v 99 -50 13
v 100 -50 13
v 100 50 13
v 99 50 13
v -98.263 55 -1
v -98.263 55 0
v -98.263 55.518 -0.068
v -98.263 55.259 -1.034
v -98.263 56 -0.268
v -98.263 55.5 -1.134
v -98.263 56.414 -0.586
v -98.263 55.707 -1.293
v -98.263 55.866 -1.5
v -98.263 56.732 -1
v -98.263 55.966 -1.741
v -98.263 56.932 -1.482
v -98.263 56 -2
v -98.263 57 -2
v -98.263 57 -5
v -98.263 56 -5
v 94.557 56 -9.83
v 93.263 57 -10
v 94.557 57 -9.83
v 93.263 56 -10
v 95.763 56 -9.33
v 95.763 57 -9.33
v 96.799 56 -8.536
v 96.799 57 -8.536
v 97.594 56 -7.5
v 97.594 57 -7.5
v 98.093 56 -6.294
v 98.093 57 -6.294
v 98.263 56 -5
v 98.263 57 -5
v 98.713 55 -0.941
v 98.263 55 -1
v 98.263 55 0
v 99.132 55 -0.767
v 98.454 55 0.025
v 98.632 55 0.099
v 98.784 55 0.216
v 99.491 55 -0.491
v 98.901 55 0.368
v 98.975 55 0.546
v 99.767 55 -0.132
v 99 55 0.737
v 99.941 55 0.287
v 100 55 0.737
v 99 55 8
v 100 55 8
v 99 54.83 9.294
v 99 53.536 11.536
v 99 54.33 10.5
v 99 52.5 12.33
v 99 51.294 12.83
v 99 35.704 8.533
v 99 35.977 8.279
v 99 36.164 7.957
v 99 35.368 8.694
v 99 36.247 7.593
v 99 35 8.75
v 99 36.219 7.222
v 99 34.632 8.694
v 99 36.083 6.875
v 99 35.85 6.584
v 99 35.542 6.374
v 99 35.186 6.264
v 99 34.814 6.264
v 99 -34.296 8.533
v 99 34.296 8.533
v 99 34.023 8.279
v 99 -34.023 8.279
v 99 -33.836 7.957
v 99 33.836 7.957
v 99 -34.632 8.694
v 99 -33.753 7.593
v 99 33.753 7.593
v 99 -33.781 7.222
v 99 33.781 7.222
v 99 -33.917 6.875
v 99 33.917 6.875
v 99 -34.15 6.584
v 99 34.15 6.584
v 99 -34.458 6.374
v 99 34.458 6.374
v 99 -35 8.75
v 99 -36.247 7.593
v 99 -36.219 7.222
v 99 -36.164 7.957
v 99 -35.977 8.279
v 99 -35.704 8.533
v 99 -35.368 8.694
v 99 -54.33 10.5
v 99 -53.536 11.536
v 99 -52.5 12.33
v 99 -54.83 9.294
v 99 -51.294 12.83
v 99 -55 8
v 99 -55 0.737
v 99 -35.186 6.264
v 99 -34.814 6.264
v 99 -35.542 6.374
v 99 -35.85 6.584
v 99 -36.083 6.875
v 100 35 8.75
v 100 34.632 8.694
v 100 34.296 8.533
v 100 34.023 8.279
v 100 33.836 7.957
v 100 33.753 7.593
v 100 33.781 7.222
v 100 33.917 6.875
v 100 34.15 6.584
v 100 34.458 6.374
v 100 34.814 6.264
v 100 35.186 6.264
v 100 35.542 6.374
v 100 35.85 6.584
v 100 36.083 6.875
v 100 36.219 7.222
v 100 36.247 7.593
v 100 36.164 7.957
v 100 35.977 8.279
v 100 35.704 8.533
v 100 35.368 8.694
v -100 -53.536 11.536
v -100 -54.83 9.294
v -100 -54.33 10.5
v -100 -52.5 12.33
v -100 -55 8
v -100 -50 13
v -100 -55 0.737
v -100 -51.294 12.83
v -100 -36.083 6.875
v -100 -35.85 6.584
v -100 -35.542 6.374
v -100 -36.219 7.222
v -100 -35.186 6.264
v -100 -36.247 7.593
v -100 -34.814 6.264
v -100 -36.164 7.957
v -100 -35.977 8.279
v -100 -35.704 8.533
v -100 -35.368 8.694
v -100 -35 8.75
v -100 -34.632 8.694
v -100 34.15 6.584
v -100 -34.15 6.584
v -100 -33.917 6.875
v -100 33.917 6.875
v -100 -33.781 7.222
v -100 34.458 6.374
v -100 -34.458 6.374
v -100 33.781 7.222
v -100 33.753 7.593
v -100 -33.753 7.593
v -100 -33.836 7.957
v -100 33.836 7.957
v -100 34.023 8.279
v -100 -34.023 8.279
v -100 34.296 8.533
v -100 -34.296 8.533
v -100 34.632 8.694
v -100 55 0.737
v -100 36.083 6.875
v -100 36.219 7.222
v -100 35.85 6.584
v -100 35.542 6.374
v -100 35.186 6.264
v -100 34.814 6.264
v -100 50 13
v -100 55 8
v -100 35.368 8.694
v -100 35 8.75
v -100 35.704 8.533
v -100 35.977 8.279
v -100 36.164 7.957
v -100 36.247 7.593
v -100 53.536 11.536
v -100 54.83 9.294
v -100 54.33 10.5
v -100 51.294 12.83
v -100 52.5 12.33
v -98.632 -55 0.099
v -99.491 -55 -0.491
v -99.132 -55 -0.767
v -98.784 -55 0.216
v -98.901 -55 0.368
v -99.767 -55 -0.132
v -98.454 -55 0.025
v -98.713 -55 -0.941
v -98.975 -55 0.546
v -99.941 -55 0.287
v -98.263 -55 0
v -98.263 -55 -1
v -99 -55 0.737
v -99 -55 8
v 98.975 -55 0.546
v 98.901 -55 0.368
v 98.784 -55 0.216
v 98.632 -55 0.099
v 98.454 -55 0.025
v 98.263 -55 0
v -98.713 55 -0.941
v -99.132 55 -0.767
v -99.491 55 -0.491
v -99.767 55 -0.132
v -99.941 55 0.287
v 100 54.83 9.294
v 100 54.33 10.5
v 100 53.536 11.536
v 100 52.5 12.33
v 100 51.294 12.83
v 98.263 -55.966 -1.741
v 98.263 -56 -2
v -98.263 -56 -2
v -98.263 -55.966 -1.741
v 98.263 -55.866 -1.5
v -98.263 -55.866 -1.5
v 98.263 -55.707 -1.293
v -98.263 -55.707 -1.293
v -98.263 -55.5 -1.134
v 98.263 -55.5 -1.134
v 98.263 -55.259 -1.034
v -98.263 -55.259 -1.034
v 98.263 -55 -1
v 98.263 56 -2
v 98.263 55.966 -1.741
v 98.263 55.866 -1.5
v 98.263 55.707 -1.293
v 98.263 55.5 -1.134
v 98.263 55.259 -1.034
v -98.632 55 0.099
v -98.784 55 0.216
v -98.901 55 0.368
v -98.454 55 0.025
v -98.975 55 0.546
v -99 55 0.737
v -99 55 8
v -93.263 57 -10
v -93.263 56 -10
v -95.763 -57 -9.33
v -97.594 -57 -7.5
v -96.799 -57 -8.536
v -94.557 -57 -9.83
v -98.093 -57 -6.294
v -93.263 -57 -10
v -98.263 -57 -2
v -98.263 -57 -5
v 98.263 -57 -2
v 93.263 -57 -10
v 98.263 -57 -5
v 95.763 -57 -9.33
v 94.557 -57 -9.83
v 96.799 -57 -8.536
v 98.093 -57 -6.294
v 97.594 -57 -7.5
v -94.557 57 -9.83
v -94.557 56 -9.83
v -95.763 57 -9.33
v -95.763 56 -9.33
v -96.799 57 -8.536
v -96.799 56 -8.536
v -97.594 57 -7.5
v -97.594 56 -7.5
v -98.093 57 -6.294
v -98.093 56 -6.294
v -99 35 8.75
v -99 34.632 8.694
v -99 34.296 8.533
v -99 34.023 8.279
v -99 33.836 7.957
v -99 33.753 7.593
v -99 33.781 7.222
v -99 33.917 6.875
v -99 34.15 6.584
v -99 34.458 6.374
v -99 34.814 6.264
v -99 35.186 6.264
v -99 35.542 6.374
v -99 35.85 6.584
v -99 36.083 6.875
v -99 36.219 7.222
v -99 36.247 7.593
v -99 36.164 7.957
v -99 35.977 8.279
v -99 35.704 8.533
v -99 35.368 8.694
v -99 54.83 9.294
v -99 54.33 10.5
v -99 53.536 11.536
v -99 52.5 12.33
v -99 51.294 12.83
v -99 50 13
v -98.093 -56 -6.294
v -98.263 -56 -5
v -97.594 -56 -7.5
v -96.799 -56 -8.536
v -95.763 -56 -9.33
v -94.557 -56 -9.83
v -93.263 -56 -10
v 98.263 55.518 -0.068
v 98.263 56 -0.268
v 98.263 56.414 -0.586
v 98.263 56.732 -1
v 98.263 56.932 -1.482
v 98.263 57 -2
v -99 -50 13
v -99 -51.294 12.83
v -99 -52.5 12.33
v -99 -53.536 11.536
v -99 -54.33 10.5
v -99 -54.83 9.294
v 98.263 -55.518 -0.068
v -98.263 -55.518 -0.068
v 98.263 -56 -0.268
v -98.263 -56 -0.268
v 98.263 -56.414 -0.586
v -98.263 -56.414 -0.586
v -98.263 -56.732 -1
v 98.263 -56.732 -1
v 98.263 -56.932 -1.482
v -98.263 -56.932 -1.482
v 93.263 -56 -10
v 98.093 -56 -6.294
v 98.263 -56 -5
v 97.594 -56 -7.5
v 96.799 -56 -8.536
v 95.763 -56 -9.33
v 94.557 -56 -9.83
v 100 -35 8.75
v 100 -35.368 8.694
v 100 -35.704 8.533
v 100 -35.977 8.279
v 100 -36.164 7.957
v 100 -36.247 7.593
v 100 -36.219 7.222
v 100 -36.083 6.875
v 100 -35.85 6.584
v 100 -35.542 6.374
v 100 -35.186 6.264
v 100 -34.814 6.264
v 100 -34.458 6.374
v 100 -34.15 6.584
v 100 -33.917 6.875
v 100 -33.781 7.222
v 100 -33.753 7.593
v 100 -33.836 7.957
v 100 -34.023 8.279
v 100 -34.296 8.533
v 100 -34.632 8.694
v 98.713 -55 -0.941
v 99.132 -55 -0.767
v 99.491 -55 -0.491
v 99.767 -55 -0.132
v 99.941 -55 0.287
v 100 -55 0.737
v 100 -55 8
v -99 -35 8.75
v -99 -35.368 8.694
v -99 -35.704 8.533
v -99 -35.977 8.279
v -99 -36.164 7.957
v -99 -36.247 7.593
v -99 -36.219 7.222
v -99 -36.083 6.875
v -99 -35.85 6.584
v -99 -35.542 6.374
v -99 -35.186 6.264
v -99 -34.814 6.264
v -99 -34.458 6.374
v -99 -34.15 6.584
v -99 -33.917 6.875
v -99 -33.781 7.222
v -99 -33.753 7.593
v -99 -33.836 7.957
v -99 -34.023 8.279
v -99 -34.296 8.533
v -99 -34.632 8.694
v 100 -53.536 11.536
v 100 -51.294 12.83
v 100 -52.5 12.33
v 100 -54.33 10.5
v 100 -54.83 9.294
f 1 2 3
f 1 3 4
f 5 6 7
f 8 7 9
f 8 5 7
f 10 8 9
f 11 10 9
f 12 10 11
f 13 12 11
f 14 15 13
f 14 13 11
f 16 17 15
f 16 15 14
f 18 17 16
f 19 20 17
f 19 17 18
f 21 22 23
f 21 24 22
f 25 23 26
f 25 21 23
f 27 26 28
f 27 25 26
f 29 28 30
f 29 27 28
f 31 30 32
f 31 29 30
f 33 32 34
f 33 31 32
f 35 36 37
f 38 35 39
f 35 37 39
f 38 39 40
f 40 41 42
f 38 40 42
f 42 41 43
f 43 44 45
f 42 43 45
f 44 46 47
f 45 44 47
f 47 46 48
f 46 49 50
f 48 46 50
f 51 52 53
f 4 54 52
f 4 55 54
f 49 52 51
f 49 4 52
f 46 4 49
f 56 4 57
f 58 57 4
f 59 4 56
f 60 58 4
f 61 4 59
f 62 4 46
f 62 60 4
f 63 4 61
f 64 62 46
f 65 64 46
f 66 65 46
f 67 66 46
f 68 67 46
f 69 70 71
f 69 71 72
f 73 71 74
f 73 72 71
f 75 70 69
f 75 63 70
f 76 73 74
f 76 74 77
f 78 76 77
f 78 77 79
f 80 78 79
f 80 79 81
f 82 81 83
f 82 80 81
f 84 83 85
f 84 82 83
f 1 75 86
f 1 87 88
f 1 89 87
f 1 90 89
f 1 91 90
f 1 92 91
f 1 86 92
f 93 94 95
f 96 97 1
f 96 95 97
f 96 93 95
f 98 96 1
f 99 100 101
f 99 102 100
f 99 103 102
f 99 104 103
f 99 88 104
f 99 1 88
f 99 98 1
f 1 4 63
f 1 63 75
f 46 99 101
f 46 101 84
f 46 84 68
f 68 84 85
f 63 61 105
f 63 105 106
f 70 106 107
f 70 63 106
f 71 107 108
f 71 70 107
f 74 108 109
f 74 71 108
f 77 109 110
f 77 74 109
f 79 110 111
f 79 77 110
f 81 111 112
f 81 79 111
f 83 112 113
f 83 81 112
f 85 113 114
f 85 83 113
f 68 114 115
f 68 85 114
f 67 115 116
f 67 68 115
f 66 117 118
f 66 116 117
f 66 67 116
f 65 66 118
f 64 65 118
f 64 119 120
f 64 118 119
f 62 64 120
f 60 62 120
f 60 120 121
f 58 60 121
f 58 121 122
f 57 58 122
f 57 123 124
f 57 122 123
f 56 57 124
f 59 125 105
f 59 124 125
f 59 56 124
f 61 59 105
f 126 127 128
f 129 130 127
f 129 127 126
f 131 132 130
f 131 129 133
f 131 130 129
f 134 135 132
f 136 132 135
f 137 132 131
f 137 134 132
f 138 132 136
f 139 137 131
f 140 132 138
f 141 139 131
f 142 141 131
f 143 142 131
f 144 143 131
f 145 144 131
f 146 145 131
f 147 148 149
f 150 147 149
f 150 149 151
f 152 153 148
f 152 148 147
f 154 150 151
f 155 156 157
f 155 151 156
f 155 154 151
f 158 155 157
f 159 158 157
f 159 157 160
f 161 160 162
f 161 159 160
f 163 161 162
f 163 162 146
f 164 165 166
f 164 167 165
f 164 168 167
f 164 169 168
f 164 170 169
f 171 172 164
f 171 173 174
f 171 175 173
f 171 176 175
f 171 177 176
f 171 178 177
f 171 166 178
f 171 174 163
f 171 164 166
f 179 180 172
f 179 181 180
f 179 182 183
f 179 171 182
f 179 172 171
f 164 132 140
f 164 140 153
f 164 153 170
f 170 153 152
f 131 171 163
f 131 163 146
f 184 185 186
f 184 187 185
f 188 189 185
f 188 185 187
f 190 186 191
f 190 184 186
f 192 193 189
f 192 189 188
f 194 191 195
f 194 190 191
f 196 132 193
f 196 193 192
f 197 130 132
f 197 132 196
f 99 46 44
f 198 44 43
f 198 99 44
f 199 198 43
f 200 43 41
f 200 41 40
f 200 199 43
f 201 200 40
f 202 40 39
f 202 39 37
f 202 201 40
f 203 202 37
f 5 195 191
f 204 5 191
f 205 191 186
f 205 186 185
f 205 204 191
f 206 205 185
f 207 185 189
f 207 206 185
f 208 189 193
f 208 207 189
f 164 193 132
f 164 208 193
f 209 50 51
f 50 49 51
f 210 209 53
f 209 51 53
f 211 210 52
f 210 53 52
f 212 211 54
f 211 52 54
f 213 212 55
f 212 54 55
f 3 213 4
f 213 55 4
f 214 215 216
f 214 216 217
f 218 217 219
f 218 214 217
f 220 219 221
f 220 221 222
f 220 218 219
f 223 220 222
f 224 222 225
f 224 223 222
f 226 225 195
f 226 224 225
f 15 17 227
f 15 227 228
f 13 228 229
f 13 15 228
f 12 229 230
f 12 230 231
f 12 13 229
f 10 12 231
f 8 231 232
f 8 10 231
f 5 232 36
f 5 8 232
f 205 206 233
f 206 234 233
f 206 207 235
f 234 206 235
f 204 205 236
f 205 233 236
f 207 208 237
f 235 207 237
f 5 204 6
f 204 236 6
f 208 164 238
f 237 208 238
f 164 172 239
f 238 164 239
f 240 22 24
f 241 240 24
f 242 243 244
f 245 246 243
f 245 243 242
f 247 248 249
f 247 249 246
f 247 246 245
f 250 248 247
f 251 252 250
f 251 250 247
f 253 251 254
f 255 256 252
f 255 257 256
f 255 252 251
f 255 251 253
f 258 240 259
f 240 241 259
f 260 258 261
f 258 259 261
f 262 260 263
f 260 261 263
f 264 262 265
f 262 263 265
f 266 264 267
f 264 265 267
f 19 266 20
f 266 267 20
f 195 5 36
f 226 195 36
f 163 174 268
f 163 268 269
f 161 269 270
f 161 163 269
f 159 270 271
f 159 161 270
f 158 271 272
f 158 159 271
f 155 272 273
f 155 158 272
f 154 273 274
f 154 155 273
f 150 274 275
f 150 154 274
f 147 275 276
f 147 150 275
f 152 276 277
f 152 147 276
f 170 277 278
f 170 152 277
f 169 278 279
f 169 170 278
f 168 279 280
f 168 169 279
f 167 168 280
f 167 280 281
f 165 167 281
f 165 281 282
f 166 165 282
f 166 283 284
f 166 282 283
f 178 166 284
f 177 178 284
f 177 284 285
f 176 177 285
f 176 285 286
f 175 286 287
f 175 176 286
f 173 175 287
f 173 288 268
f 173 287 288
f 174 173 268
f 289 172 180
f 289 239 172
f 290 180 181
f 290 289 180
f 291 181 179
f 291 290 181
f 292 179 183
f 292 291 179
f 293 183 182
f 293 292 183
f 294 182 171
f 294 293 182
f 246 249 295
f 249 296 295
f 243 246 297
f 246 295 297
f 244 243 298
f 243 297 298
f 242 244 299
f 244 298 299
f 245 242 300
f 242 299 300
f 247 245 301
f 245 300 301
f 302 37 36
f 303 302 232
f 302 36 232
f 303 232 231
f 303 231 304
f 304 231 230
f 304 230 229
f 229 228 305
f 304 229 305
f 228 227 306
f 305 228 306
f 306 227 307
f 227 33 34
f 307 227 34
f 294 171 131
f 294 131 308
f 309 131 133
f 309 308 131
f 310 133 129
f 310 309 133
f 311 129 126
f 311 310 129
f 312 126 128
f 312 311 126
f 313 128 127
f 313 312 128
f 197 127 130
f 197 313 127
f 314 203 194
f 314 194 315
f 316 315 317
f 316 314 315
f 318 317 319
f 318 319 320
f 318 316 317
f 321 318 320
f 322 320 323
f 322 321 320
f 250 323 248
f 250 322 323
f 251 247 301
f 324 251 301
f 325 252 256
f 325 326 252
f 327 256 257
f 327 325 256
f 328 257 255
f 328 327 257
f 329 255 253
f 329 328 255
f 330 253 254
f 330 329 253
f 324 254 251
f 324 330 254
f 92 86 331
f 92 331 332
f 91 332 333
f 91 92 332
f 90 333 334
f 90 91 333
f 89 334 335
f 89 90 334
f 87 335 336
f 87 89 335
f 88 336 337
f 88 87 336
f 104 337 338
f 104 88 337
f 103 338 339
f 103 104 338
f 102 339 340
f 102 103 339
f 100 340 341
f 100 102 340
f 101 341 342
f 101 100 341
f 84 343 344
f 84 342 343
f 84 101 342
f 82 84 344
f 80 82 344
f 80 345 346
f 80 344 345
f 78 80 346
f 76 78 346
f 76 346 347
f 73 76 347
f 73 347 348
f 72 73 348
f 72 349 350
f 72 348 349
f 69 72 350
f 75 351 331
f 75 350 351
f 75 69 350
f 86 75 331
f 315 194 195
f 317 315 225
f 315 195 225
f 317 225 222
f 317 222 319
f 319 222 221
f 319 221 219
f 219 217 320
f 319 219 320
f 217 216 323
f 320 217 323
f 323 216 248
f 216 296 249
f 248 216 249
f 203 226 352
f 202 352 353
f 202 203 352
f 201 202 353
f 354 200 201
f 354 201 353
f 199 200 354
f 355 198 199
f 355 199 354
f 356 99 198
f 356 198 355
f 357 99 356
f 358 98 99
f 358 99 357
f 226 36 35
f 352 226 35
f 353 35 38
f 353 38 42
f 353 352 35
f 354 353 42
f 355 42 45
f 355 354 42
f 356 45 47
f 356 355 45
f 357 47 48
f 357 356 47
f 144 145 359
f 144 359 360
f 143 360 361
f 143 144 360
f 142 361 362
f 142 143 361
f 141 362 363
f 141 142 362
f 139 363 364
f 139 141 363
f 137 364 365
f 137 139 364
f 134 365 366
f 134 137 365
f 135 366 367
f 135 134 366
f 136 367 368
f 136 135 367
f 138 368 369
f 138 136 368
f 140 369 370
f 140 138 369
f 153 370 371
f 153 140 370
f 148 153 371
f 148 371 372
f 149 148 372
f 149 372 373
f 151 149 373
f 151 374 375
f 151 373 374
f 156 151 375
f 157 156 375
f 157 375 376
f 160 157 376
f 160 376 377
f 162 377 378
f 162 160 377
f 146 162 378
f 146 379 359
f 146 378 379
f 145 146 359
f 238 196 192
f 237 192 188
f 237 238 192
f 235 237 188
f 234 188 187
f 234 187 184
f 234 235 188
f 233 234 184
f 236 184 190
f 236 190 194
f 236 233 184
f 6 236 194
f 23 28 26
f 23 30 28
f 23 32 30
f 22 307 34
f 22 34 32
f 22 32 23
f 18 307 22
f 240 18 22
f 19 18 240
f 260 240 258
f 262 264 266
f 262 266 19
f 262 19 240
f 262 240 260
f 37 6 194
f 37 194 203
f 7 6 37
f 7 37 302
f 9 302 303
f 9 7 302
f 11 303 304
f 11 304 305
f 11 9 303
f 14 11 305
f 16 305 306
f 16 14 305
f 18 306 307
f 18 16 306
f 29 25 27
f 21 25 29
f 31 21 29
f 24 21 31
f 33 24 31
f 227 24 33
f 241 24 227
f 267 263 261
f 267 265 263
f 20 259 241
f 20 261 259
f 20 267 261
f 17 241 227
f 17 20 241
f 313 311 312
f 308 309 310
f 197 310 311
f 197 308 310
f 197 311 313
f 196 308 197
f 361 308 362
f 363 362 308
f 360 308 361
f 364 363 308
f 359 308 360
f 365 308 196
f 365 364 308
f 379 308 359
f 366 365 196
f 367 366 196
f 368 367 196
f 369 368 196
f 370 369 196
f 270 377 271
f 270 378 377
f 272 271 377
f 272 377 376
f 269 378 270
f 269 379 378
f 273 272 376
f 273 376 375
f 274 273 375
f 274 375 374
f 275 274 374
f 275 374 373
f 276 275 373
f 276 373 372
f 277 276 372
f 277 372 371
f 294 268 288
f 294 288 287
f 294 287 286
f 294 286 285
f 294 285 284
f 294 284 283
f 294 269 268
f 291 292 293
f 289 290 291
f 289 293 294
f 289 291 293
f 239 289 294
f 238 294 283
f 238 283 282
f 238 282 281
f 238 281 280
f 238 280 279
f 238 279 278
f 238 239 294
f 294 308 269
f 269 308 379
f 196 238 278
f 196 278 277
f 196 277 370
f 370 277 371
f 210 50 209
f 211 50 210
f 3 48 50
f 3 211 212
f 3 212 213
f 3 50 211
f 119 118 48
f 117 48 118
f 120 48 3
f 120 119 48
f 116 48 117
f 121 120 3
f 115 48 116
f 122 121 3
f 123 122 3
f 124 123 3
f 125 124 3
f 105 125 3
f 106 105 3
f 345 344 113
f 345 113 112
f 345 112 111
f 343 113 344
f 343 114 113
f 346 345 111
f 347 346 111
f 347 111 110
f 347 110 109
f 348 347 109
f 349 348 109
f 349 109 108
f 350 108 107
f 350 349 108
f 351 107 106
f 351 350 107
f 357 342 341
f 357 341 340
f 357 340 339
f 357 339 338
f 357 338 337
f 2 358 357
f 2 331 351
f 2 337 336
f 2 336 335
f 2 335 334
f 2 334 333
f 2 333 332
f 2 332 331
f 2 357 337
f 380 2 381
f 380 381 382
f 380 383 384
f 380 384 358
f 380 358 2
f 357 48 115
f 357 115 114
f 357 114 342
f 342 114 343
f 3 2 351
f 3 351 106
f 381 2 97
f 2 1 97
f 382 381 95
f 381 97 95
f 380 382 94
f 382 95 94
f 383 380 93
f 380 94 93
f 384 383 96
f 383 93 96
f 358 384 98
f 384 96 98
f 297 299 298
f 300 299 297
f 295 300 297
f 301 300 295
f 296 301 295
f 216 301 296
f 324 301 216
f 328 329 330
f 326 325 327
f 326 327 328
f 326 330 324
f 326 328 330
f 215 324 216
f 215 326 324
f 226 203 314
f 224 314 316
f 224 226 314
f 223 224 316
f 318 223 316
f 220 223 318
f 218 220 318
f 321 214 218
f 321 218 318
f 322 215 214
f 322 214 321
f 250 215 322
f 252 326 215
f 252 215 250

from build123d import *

# Parameters (mm, degrees)
SKETCH1_W                    = 200
SKETCH1_H                    = 110
BASE_FLANGE1_DEPTH           = 1
EDGE_FLANGE1_STRIP_W         = 5.4732
EDGE_FLANGE1_STRIP_H         = 1
EDGE_FLANGE1_STRIP_CUT_DEPTH = 110
EDGE_FLANGE1_DEPTH           = 110
EDGE_FLANGE2_STRIP_W         = 5.4732
EDGE_FLANGE2_STRIP_H         = 1
EDGE_FLANGE2_STRIP_CUT_DEPTH = 110
EDGE_FLANGE2_DEPTH           = 110
CUT_EXTRUDE1_DEPTH           = 207.869524097
CUT_EXTRUDE1_DEPTH_BACK      = 10
SKETCH14_R                   = 1.25
EDGE_FLANGE3_DEPTH           = 196.5268
EDGE_FLANGE3_BEND_DEPTH      = 196.5268
FILLET1_R                    = 5


# Sheet-metal steps are written as plain solids
with BuildPart() as part:
    # Sketch1 → Base-Flange1 (new body)
    with BuildSketch(Plane.XY):
        Rectangle(SKETCH1_W, SKETCH1_H)
    extrude(amount=-BASE_FLANGE1_DEPTH)

    # Edge-Flange1 strip (across the edge) → Edge-Flange1 strip cut (cut)
    with BuildSketch(Plane(origin=(-100, 55, 0), x_dir=(1, 0, 0), z_dir=(0, -1, 0))):
        with Locations((-1, -0.5)):
            Rectangle(EDGE_FLANGE1_STRIP_W, EDGE_FLANGE1_STRIP_H)
    extrude(amount=EDGE_FLANGE1_STRIP_CUT_DEPTH, mode=Mode.SUBTRACT)

    # Edge-Flange1 section (across the edge) → Edge-Flange1 (add)
    with BuildSketch(Plane(origin=(-100, 55, 0), x_dir=(1, 0, 0), z_dir=(0, -1, 0))):
        with BuildLine():
            Line((0, 0.7366), (0, 13))
            Line((0, 13), (1, 13))
            Line((1, 13), (1, 0.7366))
            ThreePointArc((1, 0.7366), (1.215745145, 0.215745145), (1.7366, 0))
            Line((1.7366, 0), (1.7366, -1))
            ThreePointArc((1.7366, -1), (0.508638364, -0.491361636), (0, 0.7366))
        make_face()
    extrude(amount=EDGE_FLANGE1_DEPTH)

    # Edge-Flange2 strip (across the edge) → Edge-Flange2 strip cut (cut)
    with BuildSketch(Plane(origin=(100, -55, 0), x_dir=(-1, 0, 0), z_dir=(0, 1, 0))):
        with Locations((-1, -0.5)):
            Rectangle(EDGE_FLANGE2_STRIP_W, EDGE_FLANGE2_STRIP_H)
    extrude(amount=EDGE_FLANGE2_STRIP_CUT_DEPTH, mode=Mode.SUBTRACT)

    # Edge-Flange2 section (across the edge) → Edge-Flange2 (add)
    with BuildSketch(Plane(origin=(100, -55, 0), x_dir=(-1, 0, 0), z_dir=(0, 1, 0))):
        with BuildLine():
            Line((0, 0.7366), (0, 13))
            Line((0, 13), (1, 13))
            Line((1, 13), (1, 0.7366))
            ThreePointArc((1, 0.7366), (1.215745145, 0.215745145), (1.7366, 0))
            Line((1.7366, 0), (1.7366, -1))
            ThreePointArc((1.7366, -1), (0.508638364, -0.491361636), (0, 0.7366))
        make_face()
    extrude(amount=EDGE_FLANGE2_DEPTH)

    # Sketch14 → Cut-Extrude1 (cut, two sides: drawn at the far end of the back side and taken through both)
    with BuildSketch(Plane(origin=(-99, 0, 0), x_dir=(0, 0, -1), z_dir=(1, 0, 0)).offset(-CUT_EXTRUDE1_DEPTH_BACK)):
        with Locations(Location((-7.5, -35, 0), (0, 0, 180))):
            Circle(SKETCH14_R)
        with Locations(Location((-7.5, 35, 0), (0, 0, 180))):
            Circle(SKETCH14_R)
    extrude(amount=CUT_EXTRUDE1_DEPTH + CUT_EXTRUDE1_DEPTH_BACK, mode=Mode.SUBTRACT)

    # Edge-Flange3 section (across the edge) → Edge-Flange3 (add)
    with BuildSketch(Plane(origin=(98.2634, -56, -1), x_dir=(0, 1, 0), z_dir=(-1, 0, 0))):
        with BuildLine():
            Line((-1, 1), (-1, 9))
            Line((-1, 9), (0, 9))
            Line((0, 9), (0, 1))
            ThreePointArc((0, 1), (0.292893219, 0.292893219), (1, 0))
            Line((1, 0), (1, -1))
            ThreePointArc((1, -1), (-0.414213562, -0.414213562), (-1, 1))
        make_face()
    extrude(amount=EDGE_FLANGE3_DEPTH)

    # Edge-Flange3 section 2 (across the edge) → Edge-Flange3 bend (add)
    with BuildSketch(Plane(origin=(-98.2634, 56, -1), x_dir=(0, -1, 0), z_dir=(1, 0, 0))):
        with BuildLine():
            Line((-1, 1), (-1, 9))
            Line((-1, 9), (0, 9))
            Line((0, 9), (0, 1))
            ThreePointArc((0, 1), (0.292893219, 0.292893219), (1, 0))
            Line((1, 0), (1, -1))
            ThreePointArc((1, -1), (-0.414213562, -0.414213562), (-1, 1))
        make_face()
    extrude(amount=EDGE_FLANGE3_BEND_DEPTH)

    # Fillet1
    fillet1_edges = [part.edges().sort_by_distance(p)[0] for p in [
        (98.2634, -56.5, -10),
        (-98.2634, -56.5, -10),
        (-98.2634, 56.5, -10),
        (98.2634, 56.5, -10),
        (-99.5, 55, 13),
        (-99.5, -55, 13),
        (99.5, -55, 13),
        (99.5, 55, 13),
    ]]
    fillet(fillet1_edges, radius=FILLET1_R)


solid = part.part
